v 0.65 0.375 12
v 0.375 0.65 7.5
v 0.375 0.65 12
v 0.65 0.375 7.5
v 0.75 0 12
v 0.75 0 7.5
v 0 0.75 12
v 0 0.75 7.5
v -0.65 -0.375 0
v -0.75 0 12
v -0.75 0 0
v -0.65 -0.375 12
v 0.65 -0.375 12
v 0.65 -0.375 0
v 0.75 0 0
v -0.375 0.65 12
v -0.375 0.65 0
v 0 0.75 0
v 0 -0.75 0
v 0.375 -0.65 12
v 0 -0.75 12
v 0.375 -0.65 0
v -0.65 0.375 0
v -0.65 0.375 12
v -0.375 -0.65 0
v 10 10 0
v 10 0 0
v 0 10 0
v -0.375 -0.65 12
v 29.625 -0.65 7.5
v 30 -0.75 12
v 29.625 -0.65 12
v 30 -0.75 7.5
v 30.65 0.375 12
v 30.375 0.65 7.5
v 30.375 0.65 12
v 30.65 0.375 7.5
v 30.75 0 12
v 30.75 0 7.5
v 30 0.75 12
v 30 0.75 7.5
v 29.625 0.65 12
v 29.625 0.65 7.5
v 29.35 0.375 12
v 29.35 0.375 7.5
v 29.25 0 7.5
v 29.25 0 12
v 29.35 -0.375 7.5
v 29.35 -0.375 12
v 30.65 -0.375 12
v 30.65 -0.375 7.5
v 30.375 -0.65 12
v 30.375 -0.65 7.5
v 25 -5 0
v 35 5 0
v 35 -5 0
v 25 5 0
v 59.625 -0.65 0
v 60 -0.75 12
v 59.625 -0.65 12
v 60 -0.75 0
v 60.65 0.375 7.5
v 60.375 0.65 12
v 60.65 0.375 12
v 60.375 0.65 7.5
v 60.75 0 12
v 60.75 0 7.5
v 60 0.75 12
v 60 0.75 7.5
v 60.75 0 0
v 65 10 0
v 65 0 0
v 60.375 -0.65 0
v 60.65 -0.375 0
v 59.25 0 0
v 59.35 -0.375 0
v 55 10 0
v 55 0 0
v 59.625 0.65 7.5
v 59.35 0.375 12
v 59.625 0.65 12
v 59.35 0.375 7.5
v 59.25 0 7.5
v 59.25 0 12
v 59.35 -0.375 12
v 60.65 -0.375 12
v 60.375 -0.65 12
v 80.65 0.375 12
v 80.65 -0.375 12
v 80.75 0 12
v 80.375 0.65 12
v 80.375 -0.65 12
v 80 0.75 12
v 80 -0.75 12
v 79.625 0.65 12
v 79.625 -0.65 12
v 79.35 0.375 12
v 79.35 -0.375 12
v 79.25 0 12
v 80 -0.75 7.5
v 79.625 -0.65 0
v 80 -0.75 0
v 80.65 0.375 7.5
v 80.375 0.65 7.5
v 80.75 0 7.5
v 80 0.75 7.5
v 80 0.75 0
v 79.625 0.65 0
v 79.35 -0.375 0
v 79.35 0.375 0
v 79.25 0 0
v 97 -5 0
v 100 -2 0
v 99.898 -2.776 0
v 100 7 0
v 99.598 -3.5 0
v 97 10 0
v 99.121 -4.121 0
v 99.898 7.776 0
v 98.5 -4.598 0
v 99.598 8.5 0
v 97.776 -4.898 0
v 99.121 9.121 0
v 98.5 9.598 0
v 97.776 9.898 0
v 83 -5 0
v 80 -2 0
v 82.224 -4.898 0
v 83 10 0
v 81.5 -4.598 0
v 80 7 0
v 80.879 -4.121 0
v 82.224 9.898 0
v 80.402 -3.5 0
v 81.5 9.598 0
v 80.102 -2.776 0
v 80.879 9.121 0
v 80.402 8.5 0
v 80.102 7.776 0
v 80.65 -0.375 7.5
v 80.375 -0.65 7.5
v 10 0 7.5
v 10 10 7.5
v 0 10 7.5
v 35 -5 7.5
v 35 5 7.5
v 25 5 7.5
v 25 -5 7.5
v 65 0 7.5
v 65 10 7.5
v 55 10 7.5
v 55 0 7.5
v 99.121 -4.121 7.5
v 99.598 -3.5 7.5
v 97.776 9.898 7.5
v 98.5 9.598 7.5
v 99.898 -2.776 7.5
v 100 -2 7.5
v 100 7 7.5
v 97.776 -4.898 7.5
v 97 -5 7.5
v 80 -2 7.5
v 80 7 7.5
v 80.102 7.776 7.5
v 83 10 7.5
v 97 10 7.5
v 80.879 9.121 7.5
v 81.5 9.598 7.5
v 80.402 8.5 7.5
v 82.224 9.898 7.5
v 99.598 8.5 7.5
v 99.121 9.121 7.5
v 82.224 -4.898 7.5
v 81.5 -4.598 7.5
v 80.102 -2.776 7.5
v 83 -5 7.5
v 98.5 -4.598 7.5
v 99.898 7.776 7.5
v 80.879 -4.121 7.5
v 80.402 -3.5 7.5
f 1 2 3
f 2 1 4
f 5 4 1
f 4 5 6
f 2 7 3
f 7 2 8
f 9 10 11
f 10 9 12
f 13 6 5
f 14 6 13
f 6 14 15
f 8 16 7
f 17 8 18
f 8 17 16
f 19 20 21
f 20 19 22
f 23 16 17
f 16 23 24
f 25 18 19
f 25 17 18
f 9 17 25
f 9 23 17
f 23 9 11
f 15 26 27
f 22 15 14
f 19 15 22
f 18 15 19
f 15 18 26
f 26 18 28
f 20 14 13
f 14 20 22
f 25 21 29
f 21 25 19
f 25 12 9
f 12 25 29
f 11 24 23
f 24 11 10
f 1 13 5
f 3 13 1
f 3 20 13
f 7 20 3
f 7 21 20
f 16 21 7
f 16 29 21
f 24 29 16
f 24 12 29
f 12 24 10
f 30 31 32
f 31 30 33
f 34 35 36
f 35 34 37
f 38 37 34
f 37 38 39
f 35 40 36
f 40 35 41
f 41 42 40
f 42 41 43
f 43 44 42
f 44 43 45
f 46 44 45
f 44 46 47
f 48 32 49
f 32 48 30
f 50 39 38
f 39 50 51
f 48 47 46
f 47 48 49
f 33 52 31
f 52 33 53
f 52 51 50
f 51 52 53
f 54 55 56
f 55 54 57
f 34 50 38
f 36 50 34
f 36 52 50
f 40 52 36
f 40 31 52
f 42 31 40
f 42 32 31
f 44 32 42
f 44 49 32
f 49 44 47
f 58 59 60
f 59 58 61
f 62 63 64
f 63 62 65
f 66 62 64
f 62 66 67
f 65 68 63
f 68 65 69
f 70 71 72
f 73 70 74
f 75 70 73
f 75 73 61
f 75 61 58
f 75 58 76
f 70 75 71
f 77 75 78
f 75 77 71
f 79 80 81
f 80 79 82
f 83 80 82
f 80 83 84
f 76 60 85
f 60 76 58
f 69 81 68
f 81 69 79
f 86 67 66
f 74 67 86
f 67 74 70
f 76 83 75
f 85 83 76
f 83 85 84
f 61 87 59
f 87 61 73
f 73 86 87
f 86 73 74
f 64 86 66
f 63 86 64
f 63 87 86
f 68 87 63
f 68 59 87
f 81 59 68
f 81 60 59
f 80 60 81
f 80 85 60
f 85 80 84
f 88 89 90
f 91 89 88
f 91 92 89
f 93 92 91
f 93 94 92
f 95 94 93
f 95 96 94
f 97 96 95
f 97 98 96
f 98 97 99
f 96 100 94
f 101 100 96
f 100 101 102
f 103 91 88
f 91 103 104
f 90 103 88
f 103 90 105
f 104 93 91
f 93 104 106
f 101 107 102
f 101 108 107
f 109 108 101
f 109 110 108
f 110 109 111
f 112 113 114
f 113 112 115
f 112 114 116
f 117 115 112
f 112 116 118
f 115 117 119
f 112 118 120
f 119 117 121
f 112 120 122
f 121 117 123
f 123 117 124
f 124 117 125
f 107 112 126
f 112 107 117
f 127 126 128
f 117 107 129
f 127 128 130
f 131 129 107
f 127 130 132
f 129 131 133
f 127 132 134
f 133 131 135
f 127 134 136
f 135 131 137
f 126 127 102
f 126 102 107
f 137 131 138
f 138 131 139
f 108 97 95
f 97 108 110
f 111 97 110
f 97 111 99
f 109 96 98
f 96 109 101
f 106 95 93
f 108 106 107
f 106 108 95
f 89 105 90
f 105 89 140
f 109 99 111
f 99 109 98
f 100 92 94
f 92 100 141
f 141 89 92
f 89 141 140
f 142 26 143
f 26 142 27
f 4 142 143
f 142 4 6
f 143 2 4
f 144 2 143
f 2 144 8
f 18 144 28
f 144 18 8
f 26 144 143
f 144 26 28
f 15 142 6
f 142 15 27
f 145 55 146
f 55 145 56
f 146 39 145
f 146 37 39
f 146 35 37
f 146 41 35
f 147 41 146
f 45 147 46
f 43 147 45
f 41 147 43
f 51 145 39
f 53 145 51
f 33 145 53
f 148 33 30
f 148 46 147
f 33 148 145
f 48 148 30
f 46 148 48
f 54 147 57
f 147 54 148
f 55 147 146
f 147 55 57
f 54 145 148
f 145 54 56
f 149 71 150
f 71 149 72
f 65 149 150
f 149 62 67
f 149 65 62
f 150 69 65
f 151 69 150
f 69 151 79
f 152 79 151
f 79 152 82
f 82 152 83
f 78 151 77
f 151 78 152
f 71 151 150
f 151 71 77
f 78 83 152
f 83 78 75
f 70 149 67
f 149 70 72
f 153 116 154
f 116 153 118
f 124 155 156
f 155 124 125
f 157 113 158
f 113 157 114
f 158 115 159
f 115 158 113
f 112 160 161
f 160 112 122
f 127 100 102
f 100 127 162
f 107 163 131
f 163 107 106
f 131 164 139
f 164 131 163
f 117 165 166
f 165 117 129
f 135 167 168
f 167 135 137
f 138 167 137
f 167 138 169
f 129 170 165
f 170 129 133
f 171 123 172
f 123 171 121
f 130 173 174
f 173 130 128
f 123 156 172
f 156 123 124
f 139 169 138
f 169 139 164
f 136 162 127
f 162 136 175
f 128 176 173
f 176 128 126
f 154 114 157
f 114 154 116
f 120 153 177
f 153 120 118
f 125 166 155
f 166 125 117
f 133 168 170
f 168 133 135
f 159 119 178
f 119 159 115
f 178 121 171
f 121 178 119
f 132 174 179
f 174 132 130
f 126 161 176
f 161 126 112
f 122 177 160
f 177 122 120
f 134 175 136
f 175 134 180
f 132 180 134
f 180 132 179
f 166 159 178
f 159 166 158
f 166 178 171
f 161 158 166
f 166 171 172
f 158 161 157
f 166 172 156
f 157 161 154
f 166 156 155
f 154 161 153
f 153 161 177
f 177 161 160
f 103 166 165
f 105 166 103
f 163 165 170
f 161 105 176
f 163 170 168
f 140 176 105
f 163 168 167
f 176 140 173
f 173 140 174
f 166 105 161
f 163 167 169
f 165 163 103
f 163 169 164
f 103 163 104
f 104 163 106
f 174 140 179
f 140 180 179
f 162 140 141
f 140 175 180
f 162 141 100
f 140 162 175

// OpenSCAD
use <../nscad-lib.scad>

color("orange")    cube([10, 10, 7.5]);   // Referenz: Ecke im Ursprung
color("steelblue") move(30) cubec();       // XY zentriert
color("seagreen")  move(60) cubex();       // nur X zentriert
color("orchid")    move(80, -5) cube_rounded(20, 15, 7.5, r = 3);
color("red") for (x = [0, 30, 60, 80]) move(x) cylinder(d = 1.5, h = 12, $fn = 12); // Ursprung
